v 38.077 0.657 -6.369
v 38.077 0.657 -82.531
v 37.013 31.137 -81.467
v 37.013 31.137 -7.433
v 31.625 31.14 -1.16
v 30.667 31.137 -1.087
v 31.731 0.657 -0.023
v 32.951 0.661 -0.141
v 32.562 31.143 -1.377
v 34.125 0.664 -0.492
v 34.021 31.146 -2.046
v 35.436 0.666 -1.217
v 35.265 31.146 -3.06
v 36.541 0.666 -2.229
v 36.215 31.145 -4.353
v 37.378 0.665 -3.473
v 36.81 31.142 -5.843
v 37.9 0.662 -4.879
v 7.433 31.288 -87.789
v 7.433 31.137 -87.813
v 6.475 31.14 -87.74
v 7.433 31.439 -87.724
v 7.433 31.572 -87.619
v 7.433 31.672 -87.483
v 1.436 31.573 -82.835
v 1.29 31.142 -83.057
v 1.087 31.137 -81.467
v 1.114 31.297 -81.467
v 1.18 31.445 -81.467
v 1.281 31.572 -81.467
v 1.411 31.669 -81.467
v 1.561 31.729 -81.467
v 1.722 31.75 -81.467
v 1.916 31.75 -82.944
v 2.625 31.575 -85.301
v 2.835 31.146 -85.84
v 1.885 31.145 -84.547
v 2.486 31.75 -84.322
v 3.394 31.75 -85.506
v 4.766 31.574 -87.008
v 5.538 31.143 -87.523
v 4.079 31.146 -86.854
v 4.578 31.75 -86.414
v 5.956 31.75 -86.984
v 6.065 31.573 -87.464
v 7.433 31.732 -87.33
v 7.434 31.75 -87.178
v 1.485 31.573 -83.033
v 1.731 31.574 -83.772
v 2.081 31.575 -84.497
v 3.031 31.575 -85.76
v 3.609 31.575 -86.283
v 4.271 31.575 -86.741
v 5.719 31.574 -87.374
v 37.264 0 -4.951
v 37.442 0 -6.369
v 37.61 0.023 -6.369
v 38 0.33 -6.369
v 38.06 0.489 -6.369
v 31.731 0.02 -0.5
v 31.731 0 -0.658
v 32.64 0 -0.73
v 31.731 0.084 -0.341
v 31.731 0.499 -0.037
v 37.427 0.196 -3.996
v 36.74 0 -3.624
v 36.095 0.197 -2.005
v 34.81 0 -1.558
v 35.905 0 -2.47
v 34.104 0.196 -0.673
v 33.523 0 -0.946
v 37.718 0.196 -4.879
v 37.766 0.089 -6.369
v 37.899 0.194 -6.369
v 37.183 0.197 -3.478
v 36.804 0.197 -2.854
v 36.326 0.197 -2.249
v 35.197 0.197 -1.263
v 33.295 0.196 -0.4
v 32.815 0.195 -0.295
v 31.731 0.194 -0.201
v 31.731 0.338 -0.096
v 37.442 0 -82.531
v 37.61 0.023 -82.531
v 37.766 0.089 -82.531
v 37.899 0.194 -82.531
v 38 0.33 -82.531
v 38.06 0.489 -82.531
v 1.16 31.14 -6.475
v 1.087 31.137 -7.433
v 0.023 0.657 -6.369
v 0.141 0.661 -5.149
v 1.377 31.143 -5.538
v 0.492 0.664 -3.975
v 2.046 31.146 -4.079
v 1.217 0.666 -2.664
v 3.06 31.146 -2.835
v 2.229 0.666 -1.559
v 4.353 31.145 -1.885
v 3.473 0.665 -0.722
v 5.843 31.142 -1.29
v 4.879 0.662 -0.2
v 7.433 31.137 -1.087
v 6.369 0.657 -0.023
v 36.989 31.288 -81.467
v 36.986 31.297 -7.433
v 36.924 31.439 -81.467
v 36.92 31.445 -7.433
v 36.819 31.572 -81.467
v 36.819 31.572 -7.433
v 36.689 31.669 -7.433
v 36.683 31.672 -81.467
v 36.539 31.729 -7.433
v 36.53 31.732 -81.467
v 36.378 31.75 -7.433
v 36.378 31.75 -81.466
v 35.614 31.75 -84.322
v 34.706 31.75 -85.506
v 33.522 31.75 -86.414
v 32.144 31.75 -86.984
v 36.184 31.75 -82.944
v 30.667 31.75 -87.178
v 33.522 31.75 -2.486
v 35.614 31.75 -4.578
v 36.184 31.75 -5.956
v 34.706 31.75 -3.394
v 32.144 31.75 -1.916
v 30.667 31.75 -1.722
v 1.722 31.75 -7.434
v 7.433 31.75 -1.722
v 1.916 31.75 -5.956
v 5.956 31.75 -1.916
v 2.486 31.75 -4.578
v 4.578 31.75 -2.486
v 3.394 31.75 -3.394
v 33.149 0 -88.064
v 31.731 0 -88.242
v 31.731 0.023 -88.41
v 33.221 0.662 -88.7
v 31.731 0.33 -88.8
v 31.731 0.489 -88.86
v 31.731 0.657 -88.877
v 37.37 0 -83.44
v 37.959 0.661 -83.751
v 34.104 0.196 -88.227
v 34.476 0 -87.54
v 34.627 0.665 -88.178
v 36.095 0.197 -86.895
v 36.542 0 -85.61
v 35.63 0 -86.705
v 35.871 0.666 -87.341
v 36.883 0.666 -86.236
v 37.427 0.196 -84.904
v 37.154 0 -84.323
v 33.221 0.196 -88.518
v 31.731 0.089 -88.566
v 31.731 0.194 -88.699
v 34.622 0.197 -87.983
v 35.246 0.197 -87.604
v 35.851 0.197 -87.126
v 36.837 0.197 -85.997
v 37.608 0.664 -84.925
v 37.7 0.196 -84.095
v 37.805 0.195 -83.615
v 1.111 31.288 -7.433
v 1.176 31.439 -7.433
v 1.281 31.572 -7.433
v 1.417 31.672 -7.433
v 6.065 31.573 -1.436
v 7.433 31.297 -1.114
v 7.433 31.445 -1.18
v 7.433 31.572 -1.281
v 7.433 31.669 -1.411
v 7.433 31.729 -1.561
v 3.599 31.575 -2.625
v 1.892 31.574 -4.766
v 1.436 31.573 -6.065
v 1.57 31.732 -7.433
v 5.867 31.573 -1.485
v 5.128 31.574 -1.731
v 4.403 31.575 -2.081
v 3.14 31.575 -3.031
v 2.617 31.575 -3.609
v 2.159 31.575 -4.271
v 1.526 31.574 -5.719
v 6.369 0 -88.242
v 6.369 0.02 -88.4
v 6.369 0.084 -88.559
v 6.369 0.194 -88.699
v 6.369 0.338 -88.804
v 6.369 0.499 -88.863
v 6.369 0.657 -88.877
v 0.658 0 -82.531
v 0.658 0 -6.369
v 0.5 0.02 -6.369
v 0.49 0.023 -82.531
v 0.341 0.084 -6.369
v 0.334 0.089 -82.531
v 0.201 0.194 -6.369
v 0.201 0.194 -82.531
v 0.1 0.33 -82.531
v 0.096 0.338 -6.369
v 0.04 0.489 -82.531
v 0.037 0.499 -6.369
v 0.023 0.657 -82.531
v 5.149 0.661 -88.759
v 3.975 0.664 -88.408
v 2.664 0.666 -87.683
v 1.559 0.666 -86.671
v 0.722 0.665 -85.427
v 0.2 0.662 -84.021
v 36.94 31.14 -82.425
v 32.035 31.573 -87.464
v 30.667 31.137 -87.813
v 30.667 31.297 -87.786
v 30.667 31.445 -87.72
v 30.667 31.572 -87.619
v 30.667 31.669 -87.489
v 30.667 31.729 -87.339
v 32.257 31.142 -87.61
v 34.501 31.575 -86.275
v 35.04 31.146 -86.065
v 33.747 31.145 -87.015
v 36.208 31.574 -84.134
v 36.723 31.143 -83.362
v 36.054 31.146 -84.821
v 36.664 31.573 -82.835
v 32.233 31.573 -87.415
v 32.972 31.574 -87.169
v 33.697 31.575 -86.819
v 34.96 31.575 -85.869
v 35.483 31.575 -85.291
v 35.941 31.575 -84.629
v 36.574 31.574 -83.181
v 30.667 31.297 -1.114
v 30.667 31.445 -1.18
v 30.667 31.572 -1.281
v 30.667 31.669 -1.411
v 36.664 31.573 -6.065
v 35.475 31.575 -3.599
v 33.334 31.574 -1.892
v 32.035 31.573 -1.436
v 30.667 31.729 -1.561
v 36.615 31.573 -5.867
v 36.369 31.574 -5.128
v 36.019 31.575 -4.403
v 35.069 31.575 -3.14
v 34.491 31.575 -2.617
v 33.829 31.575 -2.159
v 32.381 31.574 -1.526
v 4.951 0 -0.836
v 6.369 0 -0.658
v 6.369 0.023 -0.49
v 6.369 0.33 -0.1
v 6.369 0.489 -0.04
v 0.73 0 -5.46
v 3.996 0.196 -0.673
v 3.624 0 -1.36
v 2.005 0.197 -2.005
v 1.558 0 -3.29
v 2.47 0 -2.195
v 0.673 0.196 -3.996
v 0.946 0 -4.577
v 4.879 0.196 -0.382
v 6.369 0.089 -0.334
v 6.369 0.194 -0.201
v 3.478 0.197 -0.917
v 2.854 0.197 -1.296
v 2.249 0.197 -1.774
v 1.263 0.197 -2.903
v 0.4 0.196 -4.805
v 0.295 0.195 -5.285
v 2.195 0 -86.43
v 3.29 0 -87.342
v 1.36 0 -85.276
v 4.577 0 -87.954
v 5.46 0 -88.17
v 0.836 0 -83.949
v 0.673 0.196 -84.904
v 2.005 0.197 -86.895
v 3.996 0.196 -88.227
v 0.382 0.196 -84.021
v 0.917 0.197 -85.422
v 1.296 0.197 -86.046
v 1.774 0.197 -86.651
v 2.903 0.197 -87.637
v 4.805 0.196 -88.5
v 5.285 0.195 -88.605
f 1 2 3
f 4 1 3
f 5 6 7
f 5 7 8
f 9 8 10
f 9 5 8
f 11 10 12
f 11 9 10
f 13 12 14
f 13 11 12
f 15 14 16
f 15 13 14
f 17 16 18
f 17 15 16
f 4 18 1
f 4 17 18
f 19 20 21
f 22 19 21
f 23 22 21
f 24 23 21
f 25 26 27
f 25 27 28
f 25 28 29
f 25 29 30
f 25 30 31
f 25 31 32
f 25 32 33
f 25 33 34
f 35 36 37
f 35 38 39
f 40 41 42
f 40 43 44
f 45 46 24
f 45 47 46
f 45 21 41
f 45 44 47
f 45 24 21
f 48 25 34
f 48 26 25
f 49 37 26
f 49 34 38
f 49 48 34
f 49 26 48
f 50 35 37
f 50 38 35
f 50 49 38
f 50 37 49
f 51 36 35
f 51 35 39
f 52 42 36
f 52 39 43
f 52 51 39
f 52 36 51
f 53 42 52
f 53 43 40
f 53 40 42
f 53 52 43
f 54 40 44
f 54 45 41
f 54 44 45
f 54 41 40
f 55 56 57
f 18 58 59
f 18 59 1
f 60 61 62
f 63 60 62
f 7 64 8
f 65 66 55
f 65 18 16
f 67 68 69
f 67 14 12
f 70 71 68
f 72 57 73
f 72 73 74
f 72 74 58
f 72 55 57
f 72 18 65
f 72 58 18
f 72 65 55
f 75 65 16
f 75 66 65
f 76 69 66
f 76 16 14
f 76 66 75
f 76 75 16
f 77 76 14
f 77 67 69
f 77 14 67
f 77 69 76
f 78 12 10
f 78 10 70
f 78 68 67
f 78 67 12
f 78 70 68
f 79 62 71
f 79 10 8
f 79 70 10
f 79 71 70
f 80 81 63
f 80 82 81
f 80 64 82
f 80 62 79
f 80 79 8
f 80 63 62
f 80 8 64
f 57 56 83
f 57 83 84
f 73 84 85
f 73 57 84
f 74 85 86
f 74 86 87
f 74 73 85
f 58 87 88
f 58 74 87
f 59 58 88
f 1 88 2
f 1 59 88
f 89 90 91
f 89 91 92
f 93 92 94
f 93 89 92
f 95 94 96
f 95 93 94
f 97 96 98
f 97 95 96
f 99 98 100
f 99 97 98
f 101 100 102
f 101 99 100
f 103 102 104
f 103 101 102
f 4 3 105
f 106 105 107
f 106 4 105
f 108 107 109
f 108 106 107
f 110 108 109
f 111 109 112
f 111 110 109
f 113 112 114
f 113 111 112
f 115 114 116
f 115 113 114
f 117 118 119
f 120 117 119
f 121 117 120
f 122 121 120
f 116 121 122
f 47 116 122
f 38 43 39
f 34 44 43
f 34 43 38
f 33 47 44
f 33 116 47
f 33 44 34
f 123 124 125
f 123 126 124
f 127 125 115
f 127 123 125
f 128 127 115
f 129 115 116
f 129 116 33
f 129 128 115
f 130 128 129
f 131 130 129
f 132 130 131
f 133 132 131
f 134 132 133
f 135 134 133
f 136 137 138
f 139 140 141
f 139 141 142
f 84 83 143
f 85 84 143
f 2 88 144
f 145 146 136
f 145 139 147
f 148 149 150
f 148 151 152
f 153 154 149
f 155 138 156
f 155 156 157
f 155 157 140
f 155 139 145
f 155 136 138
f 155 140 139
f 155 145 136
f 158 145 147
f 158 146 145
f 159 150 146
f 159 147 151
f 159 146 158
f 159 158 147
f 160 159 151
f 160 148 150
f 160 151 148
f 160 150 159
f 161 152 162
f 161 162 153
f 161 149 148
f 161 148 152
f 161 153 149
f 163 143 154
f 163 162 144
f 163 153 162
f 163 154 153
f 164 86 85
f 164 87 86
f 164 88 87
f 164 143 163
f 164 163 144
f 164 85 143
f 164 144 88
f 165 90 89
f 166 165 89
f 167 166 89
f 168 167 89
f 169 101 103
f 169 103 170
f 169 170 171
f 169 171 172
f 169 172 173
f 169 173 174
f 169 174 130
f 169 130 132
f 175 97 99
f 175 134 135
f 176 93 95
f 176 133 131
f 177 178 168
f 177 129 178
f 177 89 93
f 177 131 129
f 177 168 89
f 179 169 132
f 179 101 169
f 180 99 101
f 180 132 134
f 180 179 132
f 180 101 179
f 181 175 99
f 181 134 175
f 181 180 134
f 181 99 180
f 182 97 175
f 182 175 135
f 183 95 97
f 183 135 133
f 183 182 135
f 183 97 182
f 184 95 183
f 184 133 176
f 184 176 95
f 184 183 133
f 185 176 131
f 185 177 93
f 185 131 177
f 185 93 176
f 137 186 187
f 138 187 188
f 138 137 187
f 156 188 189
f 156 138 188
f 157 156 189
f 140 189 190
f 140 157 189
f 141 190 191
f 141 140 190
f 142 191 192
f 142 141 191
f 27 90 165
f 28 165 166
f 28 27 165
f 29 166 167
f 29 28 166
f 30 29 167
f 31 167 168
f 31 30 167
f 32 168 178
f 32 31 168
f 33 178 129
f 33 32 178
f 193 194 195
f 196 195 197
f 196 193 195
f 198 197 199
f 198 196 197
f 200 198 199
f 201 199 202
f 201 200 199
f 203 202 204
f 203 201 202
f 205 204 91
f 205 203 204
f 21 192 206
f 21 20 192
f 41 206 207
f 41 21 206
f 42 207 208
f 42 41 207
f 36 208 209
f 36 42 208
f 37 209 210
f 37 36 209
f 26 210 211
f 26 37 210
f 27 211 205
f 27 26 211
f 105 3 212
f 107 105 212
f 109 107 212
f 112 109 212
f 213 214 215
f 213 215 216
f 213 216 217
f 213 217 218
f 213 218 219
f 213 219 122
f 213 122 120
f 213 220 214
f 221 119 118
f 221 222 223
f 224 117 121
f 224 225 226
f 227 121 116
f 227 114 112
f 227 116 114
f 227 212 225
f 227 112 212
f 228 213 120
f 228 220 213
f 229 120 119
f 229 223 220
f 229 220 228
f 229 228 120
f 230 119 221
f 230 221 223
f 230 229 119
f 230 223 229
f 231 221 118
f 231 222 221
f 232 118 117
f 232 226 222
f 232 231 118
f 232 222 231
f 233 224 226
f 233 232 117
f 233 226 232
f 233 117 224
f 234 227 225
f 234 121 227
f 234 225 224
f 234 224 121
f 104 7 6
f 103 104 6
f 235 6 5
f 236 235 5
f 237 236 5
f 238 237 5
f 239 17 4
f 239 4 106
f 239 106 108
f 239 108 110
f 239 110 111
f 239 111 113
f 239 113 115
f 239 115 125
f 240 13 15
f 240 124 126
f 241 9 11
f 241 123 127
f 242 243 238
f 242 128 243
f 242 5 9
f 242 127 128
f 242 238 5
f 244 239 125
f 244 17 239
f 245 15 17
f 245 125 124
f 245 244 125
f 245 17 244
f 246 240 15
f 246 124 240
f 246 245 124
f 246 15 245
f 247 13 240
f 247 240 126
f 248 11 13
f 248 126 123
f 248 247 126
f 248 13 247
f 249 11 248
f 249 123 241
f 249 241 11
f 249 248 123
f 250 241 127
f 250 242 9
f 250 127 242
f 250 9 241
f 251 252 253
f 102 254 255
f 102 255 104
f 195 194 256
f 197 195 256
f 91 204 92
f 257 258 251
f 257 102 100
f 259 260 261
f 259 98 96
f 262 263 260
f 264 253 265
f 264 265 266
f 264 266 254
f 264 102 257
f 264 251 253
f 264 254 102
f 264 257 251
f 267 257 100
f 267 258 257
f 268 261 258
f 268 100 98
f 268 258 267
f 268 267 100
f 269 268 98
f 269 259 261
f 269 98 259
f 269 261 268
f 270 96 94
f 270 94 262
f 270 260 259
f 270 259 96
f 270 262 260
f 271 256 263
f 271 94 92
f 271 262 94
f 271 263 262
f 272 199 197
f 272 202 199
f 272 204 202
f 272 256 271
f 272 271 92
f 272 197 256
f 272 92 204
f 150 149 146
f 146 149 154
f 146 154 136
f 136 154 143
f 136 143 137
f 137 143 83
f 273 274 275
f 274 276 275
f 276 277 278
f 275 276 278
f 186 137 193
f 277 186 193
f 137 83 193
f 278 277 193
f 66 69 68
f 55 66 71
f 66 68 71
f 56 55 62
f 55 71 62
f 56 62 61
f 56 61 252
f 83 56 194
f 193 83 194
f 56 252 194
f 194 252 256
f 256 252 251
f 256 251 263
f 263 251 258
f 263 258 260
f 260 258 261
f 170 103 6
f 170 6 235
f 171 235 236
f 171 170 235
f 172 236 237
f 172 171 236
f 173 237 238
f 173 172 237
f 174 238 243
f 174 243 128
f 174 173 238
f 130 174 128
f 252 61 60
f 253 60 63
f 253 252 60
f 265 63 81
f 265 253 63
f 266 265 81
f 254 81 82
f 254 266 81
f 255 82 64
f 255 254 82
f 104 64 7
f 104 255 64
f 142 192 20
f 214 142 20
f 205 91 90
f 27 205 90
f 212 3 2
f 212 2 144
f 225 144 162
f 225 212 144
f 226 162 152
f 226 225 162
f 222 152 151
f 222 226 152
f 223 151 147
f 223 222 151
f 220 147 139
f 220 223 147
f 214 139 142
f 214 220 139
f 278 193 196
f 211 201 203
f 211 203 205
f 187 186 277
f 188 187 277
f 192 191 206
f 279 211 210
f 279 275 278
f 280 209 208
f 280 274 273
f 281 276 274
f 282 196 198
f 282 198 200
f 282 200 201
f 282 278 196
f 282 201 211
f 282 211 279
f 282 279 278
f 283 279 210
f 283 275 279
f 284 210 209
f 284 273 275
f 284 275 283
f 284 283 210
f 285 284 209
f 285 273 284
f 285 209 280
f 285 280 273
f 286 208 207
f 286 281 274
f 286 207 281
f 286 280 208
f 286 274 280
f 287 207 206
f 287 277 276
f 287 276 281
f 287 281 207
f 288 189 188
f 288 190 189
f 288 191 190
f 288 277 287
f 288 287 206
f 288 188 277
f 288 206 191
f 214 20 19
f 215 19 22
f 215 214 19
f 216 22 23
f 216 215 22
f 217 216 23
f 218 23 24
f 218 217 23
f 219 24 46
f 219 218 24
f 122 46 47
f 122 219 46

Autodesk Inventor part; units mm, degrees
ref_plane "YZ Plane" through (0, 0, 0) normal (1, 0, 0) x (0, 1, 0)
ref_plane "XZ Plane" through (0, 0, 0) normal (0, 1, 0) x (-1, 0, 0)
ref_plane "XY Plane" through (0, 0, 0) normal (0, 0, 1) x (1, 0, 0)
sketch "Sketch1" plane through (0, 0, 0) normal (0, 1, 0) x (-1, 0, 0)
  line L0 (0, 0) -> (-38.1, 0)
  line L1 (-38.1, 0) -> (-38.1, -88.9)
  line L2 (-38.1, -88.9) -> (0, -88.9)
  line L3 (0, -88.9) -> (0, 0)
  dimension "d0" = 38.1
  dimension "d1" = 88.9
extrude "Extrusion1" add sketch "Sketch1" along normal blind 31.75 draft -2
fillet "Fillet1" radius 6.35 4 edges at (0.5544, 15.875, -0.5544) (37.5456, 15.875, -88.3456) (0.5544, 15.875, -88.3456) (37.5456, 15.875, -0.5544)
fillet "Fillet2" radius 0.635 16 edges at (35.133, 31.75, -2.967) (19.05, 31.75, -1.1087) (2.967, 31.75, -2.967) (1.1087, 31.75, -44.45) (2.967, 31.75, -85.933) (19.05, 31.75, -87.7913) (35.133, 31.75, -85.933) (36.9913, 31.75, -44.45) (36.2417, 0, -87.0417) (19.05, 0, -88.9) (1.8583, 0, -87.0417) (0, 0, -44.45) (1.8583, 0, -1.8583) (19.05, 0, 0) (36.2417, 0, -1.8583) (38.1, 0, -44.45)
properties part number "Drive" material "Steel, Cast"
